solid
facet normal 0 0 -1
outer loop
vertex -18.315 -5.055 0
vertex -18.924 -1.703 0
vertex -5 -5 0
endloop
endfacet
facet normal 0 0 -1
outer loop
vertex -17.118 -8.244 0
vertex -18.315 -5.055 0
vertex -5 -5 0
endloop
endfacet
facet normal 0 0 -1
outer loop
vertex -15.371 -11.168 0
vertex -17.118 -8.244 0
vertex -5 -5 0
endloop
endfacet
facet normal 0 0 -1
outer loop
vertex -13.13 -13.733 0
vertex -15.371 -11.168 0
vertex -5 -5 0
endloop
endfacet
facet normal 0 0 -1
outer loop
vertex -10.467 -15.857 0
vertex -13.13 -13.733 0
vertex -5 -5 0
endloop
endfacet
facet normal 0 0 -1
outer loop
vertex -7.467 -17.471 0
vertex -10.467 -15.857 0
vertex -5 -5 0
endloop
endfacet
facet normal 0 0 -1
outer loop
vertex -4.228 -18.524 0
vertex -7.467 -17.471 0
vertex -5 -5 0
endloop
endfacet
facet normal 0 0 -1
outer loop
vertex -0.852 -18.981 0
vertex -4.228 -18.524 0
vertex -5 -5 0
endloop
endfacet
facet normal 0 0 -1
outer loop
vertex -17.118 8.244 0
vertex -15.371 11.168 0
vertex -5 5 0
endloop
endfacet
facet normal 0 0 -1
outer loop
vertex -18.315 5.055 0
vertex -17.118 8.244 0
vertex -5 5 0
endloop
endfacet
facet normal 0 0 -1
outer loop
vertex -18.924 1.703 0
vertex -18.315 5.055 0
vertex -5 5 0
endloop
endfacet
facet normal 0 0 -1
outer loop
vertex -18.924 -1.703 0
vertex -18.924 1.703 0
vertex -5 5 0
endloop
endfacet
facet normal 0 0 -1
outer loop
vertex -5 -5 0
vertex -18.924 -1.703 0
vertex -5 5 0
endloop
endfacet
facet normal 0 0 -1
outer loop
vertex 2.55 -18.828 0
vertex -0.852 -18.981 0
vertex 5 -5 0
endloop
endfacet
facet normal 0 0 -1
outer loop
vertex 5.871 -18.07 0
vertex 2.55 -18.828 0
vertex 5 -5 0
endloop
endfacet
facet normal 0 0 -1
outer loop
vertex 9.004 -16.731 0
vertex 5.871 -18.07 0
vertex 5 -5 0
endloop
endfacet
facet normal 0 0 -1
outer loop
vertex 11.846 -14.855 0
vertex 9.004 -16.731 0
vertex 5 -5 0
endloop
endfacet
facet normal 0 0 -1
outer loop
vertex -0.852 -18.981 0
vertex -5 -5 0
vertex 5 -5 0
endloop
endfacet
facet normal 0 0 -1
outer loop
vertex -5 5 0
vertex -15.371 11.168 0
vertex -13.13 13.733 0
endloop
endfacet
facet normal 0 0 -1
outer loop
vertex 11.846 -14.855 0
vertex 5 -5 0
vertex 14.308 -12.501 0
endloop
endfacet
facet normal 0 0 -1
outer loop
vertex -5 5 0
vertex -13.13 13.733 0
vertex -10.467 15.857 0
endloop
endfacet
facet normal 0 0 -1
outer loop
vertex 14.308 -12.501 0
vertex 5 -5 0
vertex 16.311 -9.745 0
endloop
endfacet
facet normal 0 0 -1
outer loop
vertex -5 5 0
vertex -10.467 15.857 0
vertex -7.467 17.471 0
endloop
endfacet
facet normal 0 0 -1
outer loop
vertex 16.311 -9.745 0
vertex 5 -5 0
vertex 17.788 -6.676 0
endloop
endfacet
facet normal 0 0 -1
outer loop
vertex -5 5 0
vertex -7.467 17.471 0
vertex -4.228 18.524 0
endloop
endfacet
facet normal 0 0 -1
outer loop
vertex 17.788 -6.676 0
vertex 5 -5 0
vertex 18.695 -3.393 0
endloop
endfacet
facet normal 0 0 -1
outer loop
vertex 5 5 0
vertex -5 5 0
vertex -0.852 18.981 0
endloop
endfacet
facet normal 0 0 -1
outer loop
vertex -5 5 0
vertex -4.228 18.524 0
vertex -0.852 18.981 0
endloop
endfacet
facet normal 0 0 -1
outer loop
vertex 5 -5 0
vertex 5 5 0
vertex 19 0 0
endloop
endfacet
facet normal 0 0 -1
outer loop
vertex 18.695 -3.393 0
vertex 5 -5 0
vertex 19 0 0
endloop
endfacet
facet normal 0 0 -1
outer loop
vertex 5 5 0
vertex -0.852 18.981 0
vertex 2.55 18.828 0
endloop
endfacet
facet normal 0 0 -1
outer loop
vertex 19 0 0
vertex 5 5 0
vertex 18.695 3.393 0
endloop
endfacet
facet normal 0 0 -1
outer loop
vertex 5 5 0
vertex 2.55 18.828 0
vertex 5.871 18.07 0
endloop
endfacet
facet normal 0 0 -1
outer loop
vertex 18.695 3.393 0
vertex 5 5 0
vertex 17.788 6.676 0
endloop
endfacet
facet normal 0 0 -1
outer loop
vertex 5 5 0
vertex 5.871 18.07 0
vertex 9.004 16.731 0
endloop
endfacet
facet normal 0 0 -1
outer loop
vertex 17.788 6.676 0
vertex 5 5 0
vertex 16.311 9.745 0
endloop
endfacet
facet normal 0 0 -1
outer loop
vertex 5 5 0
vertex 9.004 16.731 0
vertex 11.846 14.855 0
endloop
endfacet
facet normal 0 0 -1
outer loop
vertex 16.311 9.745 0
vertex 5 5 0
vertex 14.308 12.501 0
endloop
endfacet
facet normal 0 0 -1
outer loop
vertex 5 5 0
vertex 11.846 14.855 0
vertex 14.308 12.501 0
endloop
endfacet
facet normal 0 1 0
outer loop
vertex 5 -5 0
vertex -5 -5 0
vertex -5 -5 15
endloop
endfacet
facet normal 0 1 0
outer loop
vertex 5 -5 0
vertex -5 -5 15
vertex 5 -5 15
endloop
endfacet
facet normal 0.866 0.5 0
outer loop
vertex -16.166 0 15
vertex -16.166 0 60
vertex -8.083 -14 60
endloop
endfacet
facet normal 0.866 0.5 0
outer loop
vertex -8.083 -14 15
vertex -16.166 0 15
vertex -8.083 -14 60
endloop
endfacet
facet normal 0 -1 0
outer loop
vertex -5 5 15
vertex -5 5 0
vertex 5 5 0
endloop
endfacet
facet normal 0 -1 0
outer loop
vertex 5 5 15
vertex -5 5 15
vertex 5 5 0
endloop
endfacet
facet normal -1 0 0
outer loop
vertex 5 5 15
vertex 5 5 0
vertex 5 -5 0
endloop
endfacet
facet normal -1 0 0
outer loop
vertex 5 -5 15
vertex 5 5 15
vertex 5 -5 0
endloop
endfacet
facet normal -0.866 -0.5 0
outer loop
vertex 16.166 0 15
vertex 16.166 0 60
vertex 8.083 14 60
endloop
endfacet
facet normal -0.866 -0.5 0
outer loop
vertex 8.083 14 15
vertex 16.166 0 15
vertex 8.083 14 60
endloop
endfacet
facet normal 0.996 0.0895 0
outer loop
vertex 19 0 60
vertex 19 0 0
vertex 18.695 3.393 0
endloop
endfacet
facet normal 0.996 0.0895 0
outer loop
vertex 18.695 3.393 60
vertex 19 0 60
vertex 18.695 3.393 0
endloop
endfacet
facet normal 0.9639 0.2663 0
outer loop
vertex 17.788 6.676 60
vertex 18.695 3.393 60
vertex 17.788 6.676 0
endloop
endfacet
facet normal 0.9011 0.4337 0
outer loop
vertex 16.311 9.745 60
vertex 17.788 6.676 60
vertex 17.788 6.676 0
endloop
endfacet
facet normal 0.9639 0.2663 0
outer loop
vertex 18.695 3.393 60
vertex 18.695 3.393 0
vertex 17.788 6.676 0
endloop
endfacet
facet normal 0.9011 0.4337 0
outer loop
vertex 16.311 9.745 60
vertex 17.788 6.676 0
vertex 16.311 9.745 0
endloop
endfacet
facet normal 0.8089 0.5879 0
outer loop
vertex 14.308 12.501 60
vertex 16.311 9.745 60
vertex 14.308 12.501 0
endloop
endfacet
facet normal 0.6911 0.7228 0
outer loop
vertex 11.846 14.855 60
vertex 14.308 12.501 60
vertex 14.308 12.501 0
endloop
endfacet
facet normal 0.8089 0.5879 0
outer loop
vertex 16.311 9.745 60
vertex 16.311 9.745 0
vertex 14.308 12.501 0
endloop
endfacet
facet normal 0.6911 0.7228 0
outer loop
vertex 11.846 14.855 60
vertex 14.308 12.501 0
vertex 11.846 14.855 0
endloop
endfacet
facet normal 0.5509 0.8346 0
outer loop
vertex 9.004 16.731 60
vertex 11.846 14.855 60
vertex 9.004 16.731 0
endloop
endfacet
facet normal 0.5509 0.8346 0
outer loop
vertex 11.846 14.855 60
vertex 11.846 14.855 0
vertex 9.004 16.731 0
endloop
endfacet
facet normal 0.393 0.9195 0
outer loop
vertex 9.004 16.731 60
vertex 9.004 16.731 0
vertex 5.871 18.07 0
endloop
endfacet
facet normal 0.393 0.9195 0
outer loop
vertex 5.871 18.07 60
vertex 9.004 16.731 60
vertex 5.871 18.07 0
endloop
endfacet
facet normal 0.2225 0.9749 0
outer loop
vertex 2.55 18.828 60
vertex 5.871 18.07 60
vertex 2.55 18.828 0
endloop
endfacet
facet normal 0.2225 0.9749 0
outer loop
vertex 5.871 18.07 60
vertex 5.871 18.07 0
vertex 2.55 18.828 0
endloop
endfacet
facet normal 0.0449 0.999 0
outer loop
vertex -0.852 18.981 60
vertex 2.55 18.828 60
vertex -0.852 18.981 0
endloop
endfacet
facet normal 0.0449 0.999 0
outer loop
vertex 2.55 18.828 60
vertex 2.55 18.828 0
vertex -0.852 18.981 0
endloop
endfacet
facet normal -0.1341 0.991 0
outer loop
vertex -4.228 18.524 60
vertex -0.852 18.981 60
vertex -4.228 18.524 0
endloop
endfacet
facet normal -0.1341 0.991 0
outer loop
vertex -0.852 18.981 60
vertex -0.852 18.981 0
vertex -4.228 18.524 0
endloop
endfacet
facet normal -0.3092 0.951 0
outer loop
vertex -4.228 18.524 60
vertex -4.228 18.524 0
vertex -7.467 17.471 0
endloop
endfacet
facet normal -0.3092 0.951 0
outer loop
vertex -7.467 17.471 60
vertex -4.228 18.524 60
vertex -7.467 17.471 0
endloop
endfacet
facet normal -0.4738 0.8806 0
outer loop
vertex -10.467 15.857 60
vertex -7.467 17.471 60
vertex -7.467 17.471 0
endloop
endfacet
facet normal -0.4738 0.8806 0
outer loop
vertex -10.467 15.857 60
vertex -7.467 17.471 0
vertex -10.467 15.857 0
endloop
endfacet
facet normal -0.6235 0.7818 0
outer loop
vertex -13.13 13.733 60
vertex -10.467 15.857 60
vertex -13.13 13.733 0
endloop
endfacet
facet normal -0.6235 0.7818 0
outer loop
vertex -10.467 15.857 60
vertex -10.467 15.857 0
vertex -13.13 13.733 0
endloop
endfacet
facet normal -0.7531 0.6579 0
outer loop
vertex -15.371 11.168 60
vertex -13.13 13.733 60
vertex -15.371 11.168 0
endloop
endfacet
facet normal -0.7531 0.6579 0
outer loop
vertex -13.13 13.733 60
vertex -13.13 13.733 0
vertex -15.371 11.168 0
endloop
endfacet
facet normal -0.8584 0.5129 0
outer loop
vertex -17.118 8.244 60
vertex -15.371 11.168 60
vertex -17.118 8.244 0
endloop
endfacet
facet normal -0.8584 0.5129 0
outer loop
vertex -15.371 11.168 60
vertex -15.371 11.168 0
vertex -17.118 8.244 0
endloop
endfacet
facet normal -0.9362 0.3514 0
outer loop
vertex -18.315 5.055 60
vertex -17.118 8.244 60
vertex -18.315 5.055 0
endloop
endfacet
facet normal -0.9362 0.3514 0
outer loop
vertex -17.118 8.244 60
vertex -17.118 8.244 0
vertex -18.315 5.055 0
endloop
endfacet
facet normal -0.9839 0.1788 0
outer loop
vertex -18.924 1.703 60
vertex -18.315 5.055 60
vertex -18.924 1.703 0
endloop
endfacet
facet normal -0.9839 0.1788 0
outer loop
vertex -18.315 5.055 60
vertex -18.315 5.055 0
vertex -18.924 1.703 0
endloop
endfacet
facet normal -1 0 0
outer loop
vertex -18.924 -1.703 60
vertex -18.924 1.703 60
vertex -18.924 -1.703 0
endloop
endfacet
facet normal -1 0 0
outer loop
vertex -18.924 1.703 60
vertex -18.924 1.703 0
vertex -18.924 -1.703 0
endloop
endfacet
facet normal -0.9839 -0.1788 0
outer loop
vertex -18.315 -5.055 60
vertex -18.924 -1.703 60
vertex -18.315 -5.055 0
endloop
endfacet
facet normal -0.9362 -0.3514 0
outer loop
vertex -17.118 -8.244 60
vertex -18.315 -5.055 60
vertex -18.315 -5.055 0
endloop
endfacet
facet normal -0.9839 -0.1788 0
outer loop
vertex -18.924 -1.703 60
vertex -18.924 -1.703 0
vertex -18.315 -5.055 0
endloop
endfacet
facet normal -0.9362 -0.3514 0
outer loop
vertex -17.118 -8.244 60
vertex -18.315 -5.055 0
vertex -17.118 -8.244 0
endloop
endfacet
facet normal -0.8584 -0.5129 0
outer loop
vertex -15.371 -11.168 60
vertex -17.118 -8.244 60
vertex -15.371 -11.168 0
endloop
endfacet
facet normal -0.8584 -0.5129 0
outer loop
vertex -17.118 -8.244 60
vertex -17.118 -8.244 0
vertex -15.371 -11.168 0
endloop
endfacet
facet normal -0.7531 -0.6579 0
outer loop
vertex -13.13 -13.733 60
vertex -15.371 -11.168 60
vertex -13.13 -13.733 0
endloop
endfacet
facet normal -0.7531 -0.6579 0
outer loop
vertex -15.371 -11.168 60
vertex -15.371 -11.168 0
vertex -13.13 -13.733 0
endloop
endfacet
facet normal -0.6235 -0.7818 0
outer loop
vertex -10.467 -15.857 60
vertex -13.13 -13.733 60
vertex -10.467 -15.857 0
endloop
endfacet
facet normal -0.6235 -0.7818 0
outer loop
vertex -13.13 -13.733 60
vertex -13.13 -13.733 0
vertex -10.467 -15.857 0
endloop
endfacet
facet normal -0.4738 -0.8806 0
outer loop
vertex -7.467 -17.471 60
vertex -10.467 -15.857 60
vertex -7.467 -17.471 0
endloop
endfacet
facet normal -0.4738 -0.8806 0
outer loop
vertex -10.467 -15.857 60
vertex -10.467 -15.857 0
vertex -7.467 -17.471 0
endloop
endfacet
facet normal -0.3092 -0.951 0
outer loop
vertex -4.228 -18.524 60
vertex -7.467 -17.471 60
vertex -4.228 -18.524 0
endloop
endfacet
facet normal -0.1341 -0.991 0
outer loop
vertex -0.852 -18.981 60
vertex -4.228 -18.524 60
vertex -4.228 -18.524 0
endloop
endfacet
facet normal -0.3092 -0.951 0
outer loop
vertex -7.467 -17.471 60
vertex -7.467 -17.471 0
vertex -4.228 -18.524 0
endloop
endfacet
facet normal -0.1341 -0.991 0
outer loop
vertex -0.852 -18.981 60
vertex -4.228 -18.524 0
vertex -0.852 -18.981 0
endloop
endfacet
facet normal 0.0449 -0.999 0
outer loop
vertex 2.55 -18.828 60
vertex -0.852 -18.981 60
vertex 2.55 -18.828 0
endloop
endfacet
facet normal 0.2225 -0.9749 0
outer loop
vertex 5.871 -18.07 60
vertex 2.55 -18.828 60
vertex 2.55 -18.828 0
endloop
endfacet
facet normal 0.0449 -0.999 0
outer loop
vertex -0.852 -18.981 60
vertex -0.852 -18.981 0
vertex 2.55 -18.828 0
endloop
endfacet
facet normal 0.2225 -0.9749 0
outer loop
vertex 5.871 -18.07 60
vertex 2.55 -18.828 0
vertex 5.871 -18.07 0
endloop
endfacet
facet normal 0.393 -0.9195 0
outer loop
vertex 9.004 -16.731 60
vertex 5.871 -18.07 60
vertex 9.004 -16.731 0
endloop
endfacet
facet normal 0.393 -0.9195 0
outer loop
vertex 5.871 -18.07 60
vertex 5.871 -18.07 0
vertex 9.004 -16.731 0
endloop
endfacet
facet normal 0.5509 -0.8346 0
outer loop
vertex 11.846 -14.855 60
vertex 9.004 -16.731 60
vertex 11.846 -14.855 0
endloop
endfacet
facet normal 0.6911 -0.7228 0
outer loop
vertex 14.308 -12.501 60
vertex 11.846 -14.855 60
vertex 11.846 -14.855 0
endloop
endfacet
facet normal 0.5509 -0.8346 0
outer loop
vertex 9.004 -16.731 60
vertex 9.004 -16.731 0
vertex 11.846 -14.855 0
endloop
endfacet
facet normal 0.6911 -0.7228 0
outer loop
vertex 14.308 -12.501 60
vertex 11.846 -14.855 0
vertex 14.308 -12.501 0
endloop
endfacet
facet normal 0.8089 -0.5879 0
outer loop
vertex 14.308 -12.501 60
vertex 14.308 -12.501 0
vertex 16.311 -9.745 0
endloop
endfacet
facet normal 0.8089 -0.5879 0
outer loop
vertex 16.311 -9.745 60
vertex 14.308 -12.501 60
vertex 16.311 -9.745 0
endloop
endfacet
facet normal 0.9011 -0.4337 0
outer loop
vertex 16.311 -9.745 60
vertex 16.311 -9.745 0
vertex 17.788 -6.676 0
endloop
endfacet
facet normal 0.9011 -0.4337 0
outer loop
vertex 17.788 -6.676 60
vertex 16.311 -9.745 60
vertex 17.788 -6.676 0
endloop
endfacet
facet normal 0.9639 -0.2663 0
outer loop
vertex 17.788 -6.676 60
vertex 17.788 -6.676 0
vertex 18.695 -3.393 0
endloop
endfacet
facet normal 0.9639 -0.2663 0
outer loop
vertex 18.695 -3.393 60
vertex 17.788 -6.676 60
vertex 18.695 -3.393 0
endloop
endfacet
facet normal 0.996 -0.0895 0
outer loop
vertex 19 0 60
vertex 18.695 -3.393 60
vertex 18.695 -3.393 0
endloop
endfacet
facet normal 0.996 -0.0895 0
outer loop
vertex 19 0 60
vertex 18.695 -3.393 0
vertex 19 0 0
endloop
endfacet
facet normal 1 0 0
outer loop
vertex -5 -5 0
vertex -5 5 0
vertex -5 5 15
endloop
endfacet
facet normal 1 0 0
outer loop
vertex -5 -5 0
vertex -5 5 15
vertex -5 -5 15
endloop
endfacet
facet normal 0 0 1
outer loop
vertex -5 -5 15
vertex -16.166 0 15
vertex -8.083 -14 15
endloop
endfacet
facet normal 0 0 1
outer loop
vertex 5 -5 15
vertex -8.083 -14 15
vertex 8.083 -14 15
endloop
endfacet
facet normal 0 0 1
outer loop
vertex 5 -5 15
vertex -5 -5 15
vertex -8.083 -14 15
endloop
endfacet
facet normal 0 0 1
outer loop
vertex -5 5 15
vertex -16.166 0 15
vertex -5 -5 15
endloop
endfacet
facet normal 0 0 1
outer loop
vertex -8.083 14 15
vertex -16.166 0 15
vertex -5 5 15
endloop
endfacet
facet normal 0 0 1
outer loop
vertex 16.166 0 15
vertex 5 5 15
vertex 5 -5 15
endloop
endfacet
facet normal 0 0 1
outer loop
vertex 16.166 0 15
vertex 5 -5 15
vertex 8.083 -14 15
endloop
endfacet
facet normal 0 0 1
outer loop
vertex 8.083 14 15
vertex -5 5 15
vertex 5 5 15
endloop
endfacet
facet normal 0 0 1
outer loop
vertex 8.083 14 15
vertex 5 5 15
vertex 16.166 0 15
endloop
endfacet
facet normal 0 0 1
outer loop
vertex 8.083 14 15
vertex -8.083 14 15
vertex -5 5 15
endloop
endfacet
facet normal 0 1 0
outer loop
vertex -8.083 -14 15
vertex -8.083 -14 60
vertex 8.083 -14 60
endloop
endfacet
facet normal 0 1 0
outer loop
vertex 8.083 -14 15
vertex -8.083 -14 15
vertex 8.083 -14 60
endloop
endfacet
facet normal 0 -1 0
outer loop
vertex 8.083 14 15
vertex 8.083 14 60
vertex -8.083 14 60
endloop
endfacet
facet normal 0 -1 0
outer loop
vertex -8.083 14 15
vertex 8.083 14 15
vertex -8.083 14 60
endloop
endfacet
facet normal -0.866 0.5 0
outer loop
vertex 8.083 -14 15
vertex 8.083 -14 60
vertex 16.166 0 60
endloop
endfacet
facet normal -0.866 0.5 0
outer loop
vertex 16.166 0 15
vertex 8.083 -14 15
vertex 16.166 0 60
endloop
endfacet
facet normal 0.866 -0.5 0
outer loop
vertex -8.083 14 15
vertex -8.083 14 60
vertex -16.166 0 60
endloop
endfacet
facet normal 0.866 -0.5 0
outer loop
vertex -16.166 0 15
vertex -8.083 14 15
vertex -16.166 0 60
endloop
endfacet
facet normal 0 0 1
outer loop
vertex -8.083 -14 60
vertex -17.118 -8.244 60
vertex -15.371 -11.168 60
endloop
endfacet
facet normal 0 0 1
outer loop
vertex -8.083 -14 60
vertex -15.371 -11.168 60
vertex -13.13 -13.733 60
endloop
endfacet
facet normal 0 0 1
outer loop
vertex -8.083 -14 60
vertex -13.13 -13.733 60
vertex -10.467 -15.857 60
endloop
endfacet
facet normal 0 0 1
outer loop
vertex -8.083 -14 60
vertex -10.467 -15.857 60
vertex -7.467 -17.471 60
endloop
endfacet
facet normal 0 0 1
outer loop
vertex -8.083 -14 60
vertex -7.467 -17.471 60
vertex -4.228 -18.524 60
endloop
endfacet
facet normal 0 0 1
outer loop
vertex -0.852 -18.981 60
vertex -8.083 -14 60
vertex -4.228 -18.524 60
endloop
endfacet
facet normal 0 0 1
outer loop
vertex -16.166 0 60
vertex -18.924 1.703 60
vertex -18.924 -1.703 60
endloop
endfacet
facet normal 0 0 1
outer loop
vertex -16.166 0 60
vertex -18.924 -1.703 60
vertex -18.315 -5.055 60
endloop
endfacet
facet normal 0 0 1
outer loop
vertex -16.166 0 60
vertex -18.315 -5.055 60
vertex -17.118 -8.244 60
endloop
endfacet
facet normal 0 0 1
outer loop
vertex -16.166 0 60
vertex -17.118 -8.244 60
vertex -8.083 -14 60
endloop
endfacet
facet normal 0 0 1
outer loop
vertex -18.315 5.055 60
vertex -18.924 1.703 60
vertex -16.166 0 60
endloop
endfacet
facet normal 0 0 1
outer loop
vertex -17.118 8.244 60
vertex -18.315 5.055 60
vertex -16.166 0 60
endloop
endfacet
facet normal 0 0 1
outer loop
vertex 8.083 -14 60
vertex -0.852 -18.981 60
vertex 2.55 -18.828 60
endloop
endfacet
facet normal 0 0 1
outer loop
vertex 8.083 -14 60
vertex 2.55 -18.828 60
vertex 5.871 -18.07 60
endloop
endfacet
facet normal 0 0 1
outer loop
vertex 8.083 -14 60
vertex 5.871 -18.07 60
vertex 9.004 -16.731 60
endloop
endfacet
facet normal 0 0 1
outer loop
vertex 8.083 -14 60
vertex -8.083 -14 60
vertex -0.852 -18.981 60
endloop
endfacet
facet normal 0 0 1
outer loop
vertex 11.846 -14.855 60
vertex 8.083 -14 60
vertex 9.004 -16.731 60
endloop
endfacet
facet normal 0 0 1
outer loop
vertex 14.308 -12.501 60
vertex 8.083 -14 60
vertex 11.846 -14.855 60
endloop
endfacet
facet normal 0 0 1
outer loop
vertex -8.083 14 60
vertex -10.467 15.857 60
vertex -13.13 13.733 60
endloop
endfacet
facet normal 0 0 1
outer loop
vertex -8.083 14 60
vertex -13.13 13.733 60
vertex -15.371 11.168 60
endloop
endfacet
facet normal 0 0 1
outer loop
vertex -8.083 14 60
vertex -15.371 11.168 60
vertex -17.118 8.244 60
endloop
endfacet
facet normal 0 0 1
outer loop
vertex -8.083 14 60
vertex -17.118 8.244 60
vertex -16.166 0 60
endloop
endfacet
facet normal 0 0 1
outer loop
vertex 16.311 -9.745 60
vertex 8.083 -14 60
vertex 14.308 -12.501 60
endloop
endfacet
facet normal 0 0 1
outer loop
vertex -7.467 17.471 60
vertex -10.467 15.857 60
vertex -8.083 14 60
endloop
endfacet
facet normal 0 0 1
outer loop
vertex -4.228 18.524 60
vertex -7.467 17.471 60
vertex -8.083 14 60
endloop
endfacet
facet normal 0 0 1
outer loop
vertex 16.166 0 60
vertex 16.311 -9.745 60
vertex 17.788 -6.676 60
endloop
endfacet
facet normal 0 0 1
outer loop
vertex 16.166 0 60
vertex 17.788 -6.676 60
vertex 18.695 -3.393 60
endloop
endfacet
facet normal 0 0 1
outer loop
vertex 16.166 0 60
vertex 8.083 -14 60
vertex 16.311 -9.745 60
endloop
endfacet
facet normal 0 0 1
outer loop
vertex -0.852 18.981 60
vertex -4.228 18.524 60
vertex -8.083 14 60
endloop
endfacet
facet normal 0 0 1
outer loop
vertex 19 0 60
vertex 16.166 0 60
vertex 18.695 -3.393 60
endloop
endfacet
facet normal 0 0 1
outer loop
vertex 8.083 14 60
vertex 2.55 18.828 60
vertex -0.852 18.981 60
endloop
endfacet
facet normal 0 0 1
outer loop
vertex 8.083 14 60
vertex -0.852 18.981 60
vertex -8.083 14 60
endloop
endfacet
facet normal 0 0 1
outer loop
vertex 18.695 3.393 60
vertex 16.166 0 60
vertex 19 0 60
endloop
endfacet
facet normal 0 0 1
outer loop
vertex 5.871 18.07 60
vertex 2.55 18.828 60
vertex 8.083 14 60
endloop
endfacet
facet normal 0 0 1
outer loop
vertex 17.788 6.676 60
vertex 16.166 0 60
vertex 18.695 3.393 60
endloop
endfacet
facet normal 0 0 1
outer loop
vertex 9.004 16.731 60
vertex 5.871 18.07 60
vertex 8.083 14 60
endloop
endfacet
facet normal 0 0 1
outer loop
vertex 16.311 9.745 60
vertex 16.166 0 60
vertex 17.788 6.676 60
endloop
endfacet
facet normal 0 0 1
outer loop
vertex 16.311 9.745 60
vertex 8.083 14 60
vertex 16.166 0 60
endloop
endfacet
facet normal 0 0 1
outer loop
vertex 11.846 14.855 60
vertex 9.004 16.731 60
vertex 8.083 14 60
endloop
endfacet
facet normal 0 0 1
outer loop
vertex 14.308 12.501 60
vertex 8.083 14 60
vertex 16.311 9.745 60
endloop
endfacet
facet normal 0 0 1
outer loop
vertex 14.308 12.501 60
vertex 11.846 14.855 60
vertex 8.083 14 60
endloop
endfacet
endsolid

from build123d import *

# Parameters (mm, degrees)
F0_R     = 19
F1_DEPTH = 60
F3_DEPTH = 45
F4_W     = 10
F4_H     = 10
F5_DEPTH = 15


with BuildPart() as f1:
    # F0 (on Top) → F1 (new body)
    with BuildSketch(Plane.XY):
        Circle(F0_R)
    extrude(amount=F1_DEPTH)

    # F2 (on face) → F3 (cut)
    with BuildSketch(Plane.XY.offset(60)):
        Polygon((8.082904, 14), (-8.082904, 14), (-16.165808, 0), (-8.082904, -14), (8.082904, -14), (16.165808, 0), align=None)
    extrude(amount=-F3_DEPTH, mode=Mode.SUBTRACT)

    # F4 (on face) → F5 (cut, through all)
    with BuildSketch(Plane(origin=(0, 0, 0), x_dir=(1, 0, 0), z_dir=(0, 0, -1))):
        Rectangle(F4_W, F4_H)
    extrude(amount=-F5_DEPTH, mode=Mode.SUBTRACT)


solid = f1.part
